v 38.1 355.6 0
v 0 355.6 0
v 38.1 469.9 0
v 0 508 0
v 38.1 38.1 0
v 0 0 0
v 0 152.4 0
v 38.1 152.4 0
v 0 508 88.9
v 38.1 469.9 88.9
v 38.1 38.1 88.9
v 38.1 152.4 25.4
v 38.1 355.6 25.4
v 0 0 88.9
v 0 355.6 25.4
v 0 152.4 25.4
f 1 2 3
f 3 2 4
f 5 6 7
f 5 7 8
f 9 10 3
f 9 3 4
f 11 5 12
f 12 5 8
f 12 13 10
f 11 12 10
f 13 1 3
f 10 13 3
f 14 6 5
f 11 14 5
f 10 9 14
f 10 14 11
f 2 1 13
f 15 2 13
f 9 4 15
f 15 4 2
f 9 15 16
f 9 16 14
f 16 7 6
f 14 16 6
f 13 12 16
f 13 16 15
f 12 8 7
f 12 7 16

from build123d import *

# Parameters (mm, degrees)
F1_DEPTH = 88.9
F2_W     = 203.2
F2_H     = 50.8
F3_DEPTH = 72.804831


with BuildPart() as f1:
    # F0 (on Top) → F1 (new body)
    with BuildSketch(Plane.XY):
        Polygon((0, 508), (0, 0), (38.1, 38.1), (38.1, 469.9), align=None)
    extrude(amount=F1_DEPTH)

    # F2 (on face) → F3 (cut)
    with BuildSketch(Plane.YZ.offset(38.1)):
        with Locations((254, 0)):
            Rectangle(F2_W, F2_H)
    extrude(amount=-F3_DEPTH, mode=Mode.SUBTRACT)


solid = f1.part
